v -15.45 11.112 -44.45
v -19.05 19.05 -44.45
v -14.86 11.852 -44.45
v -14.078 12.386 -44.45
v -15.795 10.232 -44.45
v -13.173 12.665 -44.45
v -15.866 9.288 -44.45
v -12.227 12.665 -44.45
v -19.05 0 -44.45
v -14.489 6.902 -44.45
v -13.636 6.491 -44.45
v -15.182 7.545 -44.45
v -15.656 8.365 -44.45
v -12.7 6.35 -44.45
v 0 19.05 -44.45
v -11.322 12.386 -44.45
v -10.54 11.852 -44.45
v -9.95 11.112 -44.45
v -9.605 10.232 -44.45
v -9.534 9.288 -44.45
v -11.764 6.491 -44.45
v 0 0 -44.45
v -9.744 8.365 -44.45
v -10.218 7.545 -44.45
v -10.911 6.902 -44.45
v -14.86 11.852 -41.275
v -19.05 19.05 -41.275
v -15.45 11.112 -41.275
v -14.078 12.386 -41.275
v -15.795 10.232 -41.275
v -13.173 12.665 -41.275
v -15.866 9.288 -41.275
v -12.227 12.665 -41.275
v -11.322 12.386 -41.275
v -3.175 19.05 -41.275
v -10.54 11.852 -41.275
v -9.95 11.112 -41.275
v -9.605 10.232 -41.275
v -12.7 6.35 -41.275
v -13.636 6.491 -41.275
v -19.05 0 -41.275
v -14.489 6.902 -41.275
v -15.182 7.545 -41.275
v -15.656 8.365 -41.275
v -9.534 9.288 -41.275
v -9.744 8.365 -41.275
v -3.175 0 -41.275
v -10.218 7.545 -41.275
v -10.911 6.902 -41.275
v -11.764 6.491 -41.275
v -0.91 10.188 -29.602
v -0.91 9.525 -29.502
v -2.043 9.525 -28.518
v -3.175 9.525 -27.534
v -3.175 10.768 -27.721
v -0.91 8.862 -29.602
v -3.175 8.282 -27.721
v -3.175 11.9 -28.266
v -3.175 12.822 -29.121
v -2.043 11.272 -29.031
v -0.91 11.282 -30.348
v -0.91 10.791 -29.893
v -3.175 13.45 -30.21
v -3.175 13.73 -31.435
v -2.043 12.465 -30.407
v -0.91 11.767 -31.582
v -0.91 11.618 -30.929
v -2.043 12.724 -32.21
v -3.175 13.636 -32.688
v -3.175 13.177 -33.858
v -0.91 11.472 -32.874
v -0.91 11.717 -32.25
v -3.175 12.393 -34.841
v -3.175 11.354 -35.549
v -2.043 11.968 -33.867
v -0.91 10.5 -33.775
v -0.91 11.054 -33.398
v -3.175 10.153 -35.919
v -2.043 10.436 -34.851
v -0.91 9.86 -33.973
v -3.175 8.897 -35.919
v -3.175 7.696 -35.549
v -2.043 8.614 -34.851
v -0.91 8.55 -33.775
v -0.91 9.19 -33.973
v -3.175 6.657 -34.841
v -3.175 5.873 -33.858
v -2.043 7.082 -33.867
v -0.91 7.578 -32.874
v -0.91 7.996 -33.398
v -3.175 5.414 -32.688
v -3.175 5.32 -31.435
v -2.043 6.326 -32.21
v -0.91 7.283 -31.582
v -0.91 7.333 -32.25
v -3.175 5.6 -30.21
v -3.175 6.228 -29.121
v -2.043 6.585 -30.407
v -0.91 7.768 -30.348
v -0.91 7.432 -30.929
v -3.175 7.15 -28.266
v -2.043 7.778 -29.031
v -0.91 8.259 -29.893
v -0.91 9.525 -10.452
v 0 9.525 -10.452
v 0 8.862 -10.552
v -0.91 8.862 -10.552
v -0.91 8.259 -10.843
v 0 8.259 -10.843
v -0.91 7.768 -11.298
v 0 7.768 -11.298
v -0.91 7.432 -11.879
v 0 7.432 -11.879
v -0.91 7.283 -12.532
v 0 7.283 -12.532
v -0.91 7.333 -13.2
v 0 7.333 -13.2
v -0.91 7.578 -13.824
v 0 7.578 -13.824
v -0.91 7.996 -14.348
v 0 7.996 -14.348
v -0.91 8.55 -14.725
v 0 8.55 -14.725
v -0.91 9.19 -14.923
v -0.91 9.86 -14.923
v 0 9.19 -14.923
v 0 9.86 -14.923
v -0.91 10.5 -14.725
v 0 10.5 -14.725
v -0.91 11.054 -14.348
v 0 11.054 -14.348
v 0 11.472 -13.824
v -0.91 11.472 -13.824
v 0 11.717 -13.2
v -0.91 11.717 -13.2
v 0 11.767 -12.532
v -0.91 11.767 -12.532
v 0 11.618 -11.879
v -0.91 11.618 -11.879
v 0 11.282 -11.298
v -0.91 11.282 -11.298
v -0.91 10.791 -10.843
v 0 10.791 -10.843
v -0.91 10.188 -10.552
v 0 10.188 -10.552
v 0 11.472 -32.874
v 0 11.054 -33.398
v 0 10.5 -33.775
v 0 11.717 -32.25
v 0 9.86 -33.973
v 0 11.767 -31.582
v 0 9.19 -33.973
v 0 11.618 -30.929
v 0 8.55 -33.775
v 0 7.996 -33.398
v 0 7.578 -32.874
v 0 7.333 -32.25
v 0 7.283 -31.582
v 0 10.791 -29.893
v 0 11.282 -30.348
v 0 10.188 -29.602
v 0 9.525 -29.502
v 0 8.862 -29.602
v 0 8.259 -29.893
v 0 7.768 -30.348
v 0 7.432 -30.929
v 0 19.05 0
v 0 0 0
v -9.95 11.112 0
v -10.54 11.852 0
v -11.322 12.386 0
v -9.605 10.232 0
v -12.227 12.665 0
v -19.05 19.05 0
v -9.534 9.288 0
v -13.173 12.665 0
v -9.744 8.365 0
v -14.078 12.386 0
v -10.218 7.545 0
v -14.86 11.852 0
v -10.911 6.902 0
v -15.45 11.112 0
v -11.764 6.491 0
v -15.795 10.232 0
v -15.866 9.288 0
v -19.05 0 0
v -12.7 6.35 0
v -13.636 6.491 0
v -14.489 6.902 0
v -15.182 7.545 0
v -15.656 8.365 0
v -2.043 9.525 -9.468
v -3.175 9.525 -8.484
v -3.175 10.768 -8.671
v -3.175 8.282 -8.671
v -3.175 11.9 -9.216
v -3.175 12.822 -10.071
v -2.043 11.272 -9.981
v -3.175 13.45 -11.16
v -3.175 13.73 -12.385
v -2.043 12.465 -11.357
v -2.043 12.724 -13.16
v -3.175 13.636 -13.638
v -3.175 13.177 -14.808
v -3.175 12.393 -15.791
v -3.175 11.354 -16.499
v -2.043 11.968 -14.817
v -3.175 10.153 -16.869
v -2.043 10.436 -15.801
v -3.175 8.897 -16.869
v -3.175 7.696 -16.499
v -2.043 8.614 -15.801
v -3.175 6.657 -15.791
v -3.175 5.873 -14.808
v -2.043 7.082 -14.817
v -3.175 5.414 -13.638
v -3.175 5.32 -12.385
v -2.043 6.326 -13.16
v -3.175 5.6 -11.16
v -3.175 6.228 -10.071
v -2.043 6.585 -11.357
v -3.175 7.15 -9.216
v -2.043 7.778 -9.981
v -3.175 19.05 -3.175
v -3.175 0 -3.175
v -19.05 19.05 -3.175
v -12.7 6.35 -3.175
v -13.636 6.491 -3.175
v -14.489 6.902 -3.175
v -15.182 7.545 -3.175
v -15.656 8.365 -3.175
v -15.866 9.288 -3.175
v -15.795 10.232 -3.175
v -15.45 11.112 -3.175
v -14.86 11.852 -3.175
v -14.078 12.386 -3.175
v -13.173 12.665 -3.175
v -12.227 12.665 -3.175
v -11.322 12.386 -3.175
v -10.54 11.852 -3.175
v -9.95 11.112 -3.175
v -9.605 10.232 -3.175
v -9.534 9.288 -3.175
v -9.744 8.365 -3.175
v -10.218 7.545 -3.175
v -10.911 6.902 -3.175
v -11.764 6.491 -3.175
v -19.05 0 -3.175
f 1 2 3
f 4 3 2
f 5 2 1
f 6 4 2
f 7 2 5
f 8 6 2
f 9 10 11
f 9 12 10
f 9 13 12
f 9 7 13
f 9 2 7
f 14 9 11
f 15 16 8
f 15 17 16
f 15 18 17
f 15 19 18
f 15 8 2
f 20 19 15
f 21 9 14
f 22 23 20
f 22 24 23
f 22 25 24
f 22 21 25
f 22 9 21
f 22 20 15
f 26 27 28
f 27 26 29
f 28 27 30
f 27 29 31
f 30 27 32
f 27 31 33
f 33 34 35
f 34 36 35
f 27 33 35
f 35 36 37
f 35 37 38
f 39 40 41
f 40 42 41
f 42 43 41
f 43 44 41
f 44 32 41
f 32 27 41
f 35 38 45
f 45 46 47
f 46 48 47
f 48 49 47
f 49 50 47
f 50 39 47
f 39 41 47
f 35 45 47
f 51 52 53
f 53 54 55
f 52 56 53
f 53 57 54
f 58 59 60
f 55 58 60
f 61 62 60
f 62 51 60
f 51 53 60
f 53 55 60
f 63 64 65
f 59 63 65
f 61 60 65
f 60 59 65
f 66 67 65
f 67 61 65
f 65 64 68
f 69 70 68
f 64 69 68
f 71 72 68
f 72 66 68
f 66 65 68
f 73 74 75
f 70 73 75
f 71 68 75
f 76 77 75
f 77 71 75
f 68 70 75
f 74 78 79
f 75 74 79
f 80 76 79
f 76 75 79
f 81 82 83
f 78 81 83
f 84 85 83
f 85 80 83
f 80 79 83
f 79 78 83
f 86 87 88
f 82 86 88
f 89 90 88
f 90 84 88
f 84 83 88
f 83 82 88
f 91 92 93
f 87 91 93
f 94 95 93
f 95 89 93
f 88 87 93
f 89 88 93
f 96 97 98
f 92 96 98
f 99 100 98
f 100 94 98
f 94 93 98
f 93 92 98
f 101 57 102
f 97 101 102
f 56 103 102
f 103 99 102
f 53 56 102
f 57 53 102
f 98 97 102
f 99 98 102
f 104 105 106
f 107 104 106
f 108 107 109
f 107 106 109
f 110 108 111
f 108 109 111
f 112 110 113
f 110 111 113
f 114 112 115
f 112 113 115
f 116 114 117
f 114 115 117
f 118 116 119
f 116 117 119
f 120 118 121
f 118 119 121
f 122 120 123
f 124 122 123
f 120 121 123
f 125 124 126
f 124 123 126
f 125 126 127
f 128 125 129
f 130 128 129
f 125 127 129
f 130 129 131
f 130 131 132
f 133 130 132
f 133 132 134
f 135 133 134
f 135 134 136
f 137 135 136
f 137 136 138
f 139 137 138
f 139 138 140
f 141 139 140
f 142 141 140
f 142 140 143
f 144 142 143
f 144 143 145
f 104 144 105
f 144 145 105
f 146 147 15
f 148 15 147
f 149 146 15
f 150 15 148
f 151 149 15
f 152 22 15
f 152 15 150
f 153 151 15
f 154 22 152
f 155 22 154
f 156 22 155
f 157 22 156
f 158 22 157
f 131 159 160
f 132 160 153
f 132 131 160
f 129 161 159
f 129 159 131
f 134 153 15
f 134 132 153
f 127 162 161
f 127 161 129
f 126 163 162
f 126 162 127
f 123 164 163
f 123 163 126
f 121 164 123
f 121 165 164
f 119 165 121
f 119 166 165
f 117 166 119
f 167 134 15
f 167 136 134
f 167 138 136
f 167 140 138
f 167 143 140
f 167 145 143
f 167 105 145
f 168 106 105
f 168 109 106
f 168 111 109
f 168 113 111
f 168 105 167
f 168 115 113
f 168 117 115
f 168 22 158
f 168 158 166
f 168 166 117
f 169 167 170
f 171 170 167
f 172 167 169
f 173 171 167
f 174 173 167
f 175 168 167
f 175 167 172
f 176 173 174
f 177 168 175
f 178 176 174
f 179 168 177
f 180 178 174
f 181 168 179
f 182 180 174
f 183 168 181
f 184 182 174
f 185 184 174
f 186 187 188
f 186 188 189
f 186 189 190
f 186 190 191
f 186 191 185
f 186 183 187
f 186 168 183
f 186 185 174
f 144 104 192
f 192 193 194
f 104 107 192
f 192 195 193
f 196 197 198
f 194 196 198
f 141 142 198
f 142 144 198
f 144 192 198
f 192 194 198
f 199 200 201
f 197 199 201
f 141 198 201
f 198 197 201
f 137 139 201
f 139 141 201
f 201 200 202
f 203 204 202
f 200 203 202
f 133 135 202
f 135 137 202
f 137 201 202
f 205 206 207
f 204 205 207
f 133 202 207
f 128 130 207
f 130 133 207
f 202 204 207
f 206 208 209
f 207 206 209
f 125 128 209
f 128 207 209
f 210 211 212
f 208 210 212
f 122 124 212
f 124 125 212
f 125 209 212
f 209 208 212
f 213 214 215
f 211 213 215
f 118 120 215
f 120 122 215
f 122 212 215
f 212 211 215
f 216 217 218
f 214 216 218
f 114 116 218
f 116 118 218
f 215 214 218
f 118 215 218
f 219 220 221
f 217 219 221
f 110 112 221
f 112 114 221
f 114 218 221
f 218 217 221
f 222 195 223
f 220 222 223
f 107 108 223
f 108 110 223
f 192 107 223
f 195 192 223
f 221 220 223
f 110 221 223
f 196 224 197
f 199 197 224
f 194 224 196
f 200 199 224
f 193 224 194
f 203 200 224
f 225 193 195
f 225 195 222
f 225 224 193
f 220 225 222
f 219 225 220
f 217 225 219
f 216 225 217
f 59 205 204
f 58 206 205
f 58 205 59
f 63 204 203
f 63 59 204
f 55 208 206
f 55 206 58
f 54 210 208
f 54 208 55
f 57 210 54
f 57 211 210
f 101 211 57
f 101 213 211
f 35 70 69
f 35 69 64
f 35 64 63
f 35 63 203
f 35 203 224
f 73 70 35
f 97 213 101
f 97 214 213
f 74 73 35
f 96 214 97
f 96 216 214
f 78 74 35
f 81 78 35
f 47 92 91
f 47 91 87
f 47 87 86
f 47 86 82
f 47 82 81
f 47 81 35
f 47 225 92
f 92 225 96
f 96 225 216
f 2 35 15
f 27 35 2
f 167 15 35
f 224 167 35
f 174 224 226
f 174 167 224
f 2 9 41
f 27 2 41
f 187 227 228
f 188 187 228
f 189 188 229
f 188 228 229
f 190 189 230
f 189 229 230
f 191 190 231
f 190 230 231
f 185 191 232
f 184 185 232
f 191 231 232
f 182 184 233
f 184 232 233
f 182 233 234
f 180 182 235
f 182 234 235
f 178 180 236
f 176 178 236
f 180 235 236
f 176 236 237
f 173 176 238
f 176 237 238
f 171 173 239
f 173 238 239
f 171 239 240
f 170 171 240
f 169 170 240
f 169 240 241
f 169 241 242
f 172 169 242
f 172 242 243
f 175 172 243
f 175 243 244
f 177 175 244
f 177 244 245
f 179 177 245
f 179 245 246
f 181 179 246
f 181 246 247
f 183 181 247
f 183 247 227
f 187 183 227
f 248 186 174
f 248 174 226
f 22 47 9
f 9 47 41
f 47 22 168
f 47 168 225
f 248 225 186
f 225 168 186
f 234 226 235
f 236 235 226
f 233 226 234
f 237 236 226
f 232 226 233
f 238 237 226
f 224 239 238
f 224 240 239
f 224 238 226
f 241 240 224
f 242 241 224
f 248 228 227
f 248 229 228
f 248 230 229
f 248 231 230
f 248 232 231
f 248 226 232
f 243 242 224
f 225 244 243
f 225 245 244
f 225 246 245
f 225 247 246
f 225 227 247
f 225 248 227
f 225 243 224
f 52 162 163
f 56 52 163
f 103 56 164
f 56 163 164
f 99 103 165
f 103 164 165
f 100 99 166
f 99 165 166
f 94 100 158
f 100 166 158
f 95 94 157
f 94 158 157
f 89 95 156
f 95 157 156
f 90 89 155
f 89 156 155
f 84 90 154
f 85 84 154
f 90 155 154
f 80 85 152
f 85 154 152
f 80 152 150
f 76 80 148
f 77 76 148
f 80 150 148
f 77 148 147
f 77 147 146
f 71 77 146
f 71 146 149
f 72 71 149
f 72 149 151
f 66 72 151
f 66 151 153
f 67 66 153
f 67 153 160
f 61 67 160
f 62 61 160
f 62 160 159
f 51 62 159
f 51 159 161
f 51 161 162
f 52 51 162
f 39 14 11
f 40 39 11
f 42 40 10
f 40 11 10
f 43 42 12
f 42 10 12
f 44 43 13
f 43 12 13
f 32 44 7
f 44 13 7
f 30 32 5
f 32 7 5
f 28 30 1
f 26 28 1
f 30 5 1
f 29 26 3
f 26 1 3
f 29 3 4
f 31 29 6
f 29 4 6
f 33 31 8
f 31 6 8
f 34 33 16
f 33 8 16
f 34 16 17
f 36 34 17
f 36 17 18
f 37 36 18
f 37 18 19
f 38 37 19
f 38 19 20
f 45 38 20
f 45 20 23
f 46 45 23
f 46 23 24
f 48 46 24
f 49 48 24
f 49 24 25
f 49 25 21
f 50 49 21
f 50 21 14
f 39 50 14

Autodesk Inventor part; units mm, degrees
ref_plane "YZ Plane" through (0, 0, 0) normal (1, 0, 0) x (0, 1, 0)
ref_plane "XZ Plane" through (0, 0, 0) normal (0, 1, 0) x (-1, 0, 0)
ref_plane "XY Plane" through (0, 0, 0) normal (0, 0, 1) x (1, 0, 0)
sketch "Sketch1" plane through (0, 0, 0) normal (0, 1, 0) x (-1, 0, 0)
  line L0 (0, 0) -> (19.05, 0)
  line L1 (19.05, 0) -> (19.05, -3.175)
  line L2 (19.05, -3.175) -> (0, -3.175)
  line L3 (0, -3.175) -> (0, 0)
  line L4 (0, 0) -> (3.175, 0)
  line L5 (3.175, 0) -> (3.175, -44.45)
  line L6 (3.175, -44.45) -> (0, -44.45)
  line L7 (0, -44.45) -> (0, 0)
  line L8 (0, -44.45) -> (19.05, -44.45)
  line L9 (19.05, -44.45) -> (19.05, -41.275)
  line L10 (19.05, -41.275) -> (0, -41.275)
  line L11 (0, -41.275) -> (0, -44.45)
  dimension "d0" = 19.05
  dimension "d1" = 3.175
  dimension "d2" = 3.175
  dimension "d3" = 44.45
  dimension "d4" = 19.05
  dimension "d5" = 3.175
extrude "Extrusion1" add sketch "Sketch1" along normal blind 19.05
sketch "Sketch2" plane through (-19.05, 0, 0) normal (0, 0, 1) x (1, 0, 0)
  line L0 (0, 0) -> (0, 19.05) projected
  line L1 (0, 0) -> (19.05, 0) projected
  line L2 (19.05, 0) -> (19.05, 19.05) projected
  point P0 (6.35, 9.525)
  dimension "d9" = 19.05
  dimension "d10" = 9.525
  dimension "d18" = 12.7
hole "Hole1" at (-12.7, 9.525, 0) direction (0, 0, -1) diameter 6.35 end through all
sketch "Sketch3" plane through (-3.175, 0, -41.275) normal (-1, 0, 0) x (0, 0, 1)
  line L0 (0, 19.05) -> (38.1, 19.05) projected
  line L1 (0, 0) -> (38.1, 0) projected
  line L2 (38.1, 0) -> (38.1, 19.05) projected
  line L3 (0, 0) -> (0, 19.05) projected
  point P0 (41.275, 0)
  point P1 (9.525, 9.525)
  point P2 (28.575, 9.525)
  dimension "d19" = 9.525
  dimension "d20" = 19.05
  dimension "d21" = 9.525
  dimension "d22" = 9.525
  dimension "d23" = 9.525
hole "Hole2" at (-3.175, 9.525, -31.75) at (-3.175, 9.525, -12.7) direction (1, 0, 0) diameter 4.4958 end through all countersink diameter 8.4328 countersink angle 82 clearance for "Flat Head Machine Screw (82)" size "#8" standard "Ansi Unified Screw Threads"
equation "\"d4\" = d0"
equation "\"d10\" = 0.5 * d9"
equation "\"d19\" = 0.5 * d20"
equation "\"d21\" = d19"
properties part number "CAR_045_NewCarouselTensioner1.75UChannel" material "Aluminum 6061"
